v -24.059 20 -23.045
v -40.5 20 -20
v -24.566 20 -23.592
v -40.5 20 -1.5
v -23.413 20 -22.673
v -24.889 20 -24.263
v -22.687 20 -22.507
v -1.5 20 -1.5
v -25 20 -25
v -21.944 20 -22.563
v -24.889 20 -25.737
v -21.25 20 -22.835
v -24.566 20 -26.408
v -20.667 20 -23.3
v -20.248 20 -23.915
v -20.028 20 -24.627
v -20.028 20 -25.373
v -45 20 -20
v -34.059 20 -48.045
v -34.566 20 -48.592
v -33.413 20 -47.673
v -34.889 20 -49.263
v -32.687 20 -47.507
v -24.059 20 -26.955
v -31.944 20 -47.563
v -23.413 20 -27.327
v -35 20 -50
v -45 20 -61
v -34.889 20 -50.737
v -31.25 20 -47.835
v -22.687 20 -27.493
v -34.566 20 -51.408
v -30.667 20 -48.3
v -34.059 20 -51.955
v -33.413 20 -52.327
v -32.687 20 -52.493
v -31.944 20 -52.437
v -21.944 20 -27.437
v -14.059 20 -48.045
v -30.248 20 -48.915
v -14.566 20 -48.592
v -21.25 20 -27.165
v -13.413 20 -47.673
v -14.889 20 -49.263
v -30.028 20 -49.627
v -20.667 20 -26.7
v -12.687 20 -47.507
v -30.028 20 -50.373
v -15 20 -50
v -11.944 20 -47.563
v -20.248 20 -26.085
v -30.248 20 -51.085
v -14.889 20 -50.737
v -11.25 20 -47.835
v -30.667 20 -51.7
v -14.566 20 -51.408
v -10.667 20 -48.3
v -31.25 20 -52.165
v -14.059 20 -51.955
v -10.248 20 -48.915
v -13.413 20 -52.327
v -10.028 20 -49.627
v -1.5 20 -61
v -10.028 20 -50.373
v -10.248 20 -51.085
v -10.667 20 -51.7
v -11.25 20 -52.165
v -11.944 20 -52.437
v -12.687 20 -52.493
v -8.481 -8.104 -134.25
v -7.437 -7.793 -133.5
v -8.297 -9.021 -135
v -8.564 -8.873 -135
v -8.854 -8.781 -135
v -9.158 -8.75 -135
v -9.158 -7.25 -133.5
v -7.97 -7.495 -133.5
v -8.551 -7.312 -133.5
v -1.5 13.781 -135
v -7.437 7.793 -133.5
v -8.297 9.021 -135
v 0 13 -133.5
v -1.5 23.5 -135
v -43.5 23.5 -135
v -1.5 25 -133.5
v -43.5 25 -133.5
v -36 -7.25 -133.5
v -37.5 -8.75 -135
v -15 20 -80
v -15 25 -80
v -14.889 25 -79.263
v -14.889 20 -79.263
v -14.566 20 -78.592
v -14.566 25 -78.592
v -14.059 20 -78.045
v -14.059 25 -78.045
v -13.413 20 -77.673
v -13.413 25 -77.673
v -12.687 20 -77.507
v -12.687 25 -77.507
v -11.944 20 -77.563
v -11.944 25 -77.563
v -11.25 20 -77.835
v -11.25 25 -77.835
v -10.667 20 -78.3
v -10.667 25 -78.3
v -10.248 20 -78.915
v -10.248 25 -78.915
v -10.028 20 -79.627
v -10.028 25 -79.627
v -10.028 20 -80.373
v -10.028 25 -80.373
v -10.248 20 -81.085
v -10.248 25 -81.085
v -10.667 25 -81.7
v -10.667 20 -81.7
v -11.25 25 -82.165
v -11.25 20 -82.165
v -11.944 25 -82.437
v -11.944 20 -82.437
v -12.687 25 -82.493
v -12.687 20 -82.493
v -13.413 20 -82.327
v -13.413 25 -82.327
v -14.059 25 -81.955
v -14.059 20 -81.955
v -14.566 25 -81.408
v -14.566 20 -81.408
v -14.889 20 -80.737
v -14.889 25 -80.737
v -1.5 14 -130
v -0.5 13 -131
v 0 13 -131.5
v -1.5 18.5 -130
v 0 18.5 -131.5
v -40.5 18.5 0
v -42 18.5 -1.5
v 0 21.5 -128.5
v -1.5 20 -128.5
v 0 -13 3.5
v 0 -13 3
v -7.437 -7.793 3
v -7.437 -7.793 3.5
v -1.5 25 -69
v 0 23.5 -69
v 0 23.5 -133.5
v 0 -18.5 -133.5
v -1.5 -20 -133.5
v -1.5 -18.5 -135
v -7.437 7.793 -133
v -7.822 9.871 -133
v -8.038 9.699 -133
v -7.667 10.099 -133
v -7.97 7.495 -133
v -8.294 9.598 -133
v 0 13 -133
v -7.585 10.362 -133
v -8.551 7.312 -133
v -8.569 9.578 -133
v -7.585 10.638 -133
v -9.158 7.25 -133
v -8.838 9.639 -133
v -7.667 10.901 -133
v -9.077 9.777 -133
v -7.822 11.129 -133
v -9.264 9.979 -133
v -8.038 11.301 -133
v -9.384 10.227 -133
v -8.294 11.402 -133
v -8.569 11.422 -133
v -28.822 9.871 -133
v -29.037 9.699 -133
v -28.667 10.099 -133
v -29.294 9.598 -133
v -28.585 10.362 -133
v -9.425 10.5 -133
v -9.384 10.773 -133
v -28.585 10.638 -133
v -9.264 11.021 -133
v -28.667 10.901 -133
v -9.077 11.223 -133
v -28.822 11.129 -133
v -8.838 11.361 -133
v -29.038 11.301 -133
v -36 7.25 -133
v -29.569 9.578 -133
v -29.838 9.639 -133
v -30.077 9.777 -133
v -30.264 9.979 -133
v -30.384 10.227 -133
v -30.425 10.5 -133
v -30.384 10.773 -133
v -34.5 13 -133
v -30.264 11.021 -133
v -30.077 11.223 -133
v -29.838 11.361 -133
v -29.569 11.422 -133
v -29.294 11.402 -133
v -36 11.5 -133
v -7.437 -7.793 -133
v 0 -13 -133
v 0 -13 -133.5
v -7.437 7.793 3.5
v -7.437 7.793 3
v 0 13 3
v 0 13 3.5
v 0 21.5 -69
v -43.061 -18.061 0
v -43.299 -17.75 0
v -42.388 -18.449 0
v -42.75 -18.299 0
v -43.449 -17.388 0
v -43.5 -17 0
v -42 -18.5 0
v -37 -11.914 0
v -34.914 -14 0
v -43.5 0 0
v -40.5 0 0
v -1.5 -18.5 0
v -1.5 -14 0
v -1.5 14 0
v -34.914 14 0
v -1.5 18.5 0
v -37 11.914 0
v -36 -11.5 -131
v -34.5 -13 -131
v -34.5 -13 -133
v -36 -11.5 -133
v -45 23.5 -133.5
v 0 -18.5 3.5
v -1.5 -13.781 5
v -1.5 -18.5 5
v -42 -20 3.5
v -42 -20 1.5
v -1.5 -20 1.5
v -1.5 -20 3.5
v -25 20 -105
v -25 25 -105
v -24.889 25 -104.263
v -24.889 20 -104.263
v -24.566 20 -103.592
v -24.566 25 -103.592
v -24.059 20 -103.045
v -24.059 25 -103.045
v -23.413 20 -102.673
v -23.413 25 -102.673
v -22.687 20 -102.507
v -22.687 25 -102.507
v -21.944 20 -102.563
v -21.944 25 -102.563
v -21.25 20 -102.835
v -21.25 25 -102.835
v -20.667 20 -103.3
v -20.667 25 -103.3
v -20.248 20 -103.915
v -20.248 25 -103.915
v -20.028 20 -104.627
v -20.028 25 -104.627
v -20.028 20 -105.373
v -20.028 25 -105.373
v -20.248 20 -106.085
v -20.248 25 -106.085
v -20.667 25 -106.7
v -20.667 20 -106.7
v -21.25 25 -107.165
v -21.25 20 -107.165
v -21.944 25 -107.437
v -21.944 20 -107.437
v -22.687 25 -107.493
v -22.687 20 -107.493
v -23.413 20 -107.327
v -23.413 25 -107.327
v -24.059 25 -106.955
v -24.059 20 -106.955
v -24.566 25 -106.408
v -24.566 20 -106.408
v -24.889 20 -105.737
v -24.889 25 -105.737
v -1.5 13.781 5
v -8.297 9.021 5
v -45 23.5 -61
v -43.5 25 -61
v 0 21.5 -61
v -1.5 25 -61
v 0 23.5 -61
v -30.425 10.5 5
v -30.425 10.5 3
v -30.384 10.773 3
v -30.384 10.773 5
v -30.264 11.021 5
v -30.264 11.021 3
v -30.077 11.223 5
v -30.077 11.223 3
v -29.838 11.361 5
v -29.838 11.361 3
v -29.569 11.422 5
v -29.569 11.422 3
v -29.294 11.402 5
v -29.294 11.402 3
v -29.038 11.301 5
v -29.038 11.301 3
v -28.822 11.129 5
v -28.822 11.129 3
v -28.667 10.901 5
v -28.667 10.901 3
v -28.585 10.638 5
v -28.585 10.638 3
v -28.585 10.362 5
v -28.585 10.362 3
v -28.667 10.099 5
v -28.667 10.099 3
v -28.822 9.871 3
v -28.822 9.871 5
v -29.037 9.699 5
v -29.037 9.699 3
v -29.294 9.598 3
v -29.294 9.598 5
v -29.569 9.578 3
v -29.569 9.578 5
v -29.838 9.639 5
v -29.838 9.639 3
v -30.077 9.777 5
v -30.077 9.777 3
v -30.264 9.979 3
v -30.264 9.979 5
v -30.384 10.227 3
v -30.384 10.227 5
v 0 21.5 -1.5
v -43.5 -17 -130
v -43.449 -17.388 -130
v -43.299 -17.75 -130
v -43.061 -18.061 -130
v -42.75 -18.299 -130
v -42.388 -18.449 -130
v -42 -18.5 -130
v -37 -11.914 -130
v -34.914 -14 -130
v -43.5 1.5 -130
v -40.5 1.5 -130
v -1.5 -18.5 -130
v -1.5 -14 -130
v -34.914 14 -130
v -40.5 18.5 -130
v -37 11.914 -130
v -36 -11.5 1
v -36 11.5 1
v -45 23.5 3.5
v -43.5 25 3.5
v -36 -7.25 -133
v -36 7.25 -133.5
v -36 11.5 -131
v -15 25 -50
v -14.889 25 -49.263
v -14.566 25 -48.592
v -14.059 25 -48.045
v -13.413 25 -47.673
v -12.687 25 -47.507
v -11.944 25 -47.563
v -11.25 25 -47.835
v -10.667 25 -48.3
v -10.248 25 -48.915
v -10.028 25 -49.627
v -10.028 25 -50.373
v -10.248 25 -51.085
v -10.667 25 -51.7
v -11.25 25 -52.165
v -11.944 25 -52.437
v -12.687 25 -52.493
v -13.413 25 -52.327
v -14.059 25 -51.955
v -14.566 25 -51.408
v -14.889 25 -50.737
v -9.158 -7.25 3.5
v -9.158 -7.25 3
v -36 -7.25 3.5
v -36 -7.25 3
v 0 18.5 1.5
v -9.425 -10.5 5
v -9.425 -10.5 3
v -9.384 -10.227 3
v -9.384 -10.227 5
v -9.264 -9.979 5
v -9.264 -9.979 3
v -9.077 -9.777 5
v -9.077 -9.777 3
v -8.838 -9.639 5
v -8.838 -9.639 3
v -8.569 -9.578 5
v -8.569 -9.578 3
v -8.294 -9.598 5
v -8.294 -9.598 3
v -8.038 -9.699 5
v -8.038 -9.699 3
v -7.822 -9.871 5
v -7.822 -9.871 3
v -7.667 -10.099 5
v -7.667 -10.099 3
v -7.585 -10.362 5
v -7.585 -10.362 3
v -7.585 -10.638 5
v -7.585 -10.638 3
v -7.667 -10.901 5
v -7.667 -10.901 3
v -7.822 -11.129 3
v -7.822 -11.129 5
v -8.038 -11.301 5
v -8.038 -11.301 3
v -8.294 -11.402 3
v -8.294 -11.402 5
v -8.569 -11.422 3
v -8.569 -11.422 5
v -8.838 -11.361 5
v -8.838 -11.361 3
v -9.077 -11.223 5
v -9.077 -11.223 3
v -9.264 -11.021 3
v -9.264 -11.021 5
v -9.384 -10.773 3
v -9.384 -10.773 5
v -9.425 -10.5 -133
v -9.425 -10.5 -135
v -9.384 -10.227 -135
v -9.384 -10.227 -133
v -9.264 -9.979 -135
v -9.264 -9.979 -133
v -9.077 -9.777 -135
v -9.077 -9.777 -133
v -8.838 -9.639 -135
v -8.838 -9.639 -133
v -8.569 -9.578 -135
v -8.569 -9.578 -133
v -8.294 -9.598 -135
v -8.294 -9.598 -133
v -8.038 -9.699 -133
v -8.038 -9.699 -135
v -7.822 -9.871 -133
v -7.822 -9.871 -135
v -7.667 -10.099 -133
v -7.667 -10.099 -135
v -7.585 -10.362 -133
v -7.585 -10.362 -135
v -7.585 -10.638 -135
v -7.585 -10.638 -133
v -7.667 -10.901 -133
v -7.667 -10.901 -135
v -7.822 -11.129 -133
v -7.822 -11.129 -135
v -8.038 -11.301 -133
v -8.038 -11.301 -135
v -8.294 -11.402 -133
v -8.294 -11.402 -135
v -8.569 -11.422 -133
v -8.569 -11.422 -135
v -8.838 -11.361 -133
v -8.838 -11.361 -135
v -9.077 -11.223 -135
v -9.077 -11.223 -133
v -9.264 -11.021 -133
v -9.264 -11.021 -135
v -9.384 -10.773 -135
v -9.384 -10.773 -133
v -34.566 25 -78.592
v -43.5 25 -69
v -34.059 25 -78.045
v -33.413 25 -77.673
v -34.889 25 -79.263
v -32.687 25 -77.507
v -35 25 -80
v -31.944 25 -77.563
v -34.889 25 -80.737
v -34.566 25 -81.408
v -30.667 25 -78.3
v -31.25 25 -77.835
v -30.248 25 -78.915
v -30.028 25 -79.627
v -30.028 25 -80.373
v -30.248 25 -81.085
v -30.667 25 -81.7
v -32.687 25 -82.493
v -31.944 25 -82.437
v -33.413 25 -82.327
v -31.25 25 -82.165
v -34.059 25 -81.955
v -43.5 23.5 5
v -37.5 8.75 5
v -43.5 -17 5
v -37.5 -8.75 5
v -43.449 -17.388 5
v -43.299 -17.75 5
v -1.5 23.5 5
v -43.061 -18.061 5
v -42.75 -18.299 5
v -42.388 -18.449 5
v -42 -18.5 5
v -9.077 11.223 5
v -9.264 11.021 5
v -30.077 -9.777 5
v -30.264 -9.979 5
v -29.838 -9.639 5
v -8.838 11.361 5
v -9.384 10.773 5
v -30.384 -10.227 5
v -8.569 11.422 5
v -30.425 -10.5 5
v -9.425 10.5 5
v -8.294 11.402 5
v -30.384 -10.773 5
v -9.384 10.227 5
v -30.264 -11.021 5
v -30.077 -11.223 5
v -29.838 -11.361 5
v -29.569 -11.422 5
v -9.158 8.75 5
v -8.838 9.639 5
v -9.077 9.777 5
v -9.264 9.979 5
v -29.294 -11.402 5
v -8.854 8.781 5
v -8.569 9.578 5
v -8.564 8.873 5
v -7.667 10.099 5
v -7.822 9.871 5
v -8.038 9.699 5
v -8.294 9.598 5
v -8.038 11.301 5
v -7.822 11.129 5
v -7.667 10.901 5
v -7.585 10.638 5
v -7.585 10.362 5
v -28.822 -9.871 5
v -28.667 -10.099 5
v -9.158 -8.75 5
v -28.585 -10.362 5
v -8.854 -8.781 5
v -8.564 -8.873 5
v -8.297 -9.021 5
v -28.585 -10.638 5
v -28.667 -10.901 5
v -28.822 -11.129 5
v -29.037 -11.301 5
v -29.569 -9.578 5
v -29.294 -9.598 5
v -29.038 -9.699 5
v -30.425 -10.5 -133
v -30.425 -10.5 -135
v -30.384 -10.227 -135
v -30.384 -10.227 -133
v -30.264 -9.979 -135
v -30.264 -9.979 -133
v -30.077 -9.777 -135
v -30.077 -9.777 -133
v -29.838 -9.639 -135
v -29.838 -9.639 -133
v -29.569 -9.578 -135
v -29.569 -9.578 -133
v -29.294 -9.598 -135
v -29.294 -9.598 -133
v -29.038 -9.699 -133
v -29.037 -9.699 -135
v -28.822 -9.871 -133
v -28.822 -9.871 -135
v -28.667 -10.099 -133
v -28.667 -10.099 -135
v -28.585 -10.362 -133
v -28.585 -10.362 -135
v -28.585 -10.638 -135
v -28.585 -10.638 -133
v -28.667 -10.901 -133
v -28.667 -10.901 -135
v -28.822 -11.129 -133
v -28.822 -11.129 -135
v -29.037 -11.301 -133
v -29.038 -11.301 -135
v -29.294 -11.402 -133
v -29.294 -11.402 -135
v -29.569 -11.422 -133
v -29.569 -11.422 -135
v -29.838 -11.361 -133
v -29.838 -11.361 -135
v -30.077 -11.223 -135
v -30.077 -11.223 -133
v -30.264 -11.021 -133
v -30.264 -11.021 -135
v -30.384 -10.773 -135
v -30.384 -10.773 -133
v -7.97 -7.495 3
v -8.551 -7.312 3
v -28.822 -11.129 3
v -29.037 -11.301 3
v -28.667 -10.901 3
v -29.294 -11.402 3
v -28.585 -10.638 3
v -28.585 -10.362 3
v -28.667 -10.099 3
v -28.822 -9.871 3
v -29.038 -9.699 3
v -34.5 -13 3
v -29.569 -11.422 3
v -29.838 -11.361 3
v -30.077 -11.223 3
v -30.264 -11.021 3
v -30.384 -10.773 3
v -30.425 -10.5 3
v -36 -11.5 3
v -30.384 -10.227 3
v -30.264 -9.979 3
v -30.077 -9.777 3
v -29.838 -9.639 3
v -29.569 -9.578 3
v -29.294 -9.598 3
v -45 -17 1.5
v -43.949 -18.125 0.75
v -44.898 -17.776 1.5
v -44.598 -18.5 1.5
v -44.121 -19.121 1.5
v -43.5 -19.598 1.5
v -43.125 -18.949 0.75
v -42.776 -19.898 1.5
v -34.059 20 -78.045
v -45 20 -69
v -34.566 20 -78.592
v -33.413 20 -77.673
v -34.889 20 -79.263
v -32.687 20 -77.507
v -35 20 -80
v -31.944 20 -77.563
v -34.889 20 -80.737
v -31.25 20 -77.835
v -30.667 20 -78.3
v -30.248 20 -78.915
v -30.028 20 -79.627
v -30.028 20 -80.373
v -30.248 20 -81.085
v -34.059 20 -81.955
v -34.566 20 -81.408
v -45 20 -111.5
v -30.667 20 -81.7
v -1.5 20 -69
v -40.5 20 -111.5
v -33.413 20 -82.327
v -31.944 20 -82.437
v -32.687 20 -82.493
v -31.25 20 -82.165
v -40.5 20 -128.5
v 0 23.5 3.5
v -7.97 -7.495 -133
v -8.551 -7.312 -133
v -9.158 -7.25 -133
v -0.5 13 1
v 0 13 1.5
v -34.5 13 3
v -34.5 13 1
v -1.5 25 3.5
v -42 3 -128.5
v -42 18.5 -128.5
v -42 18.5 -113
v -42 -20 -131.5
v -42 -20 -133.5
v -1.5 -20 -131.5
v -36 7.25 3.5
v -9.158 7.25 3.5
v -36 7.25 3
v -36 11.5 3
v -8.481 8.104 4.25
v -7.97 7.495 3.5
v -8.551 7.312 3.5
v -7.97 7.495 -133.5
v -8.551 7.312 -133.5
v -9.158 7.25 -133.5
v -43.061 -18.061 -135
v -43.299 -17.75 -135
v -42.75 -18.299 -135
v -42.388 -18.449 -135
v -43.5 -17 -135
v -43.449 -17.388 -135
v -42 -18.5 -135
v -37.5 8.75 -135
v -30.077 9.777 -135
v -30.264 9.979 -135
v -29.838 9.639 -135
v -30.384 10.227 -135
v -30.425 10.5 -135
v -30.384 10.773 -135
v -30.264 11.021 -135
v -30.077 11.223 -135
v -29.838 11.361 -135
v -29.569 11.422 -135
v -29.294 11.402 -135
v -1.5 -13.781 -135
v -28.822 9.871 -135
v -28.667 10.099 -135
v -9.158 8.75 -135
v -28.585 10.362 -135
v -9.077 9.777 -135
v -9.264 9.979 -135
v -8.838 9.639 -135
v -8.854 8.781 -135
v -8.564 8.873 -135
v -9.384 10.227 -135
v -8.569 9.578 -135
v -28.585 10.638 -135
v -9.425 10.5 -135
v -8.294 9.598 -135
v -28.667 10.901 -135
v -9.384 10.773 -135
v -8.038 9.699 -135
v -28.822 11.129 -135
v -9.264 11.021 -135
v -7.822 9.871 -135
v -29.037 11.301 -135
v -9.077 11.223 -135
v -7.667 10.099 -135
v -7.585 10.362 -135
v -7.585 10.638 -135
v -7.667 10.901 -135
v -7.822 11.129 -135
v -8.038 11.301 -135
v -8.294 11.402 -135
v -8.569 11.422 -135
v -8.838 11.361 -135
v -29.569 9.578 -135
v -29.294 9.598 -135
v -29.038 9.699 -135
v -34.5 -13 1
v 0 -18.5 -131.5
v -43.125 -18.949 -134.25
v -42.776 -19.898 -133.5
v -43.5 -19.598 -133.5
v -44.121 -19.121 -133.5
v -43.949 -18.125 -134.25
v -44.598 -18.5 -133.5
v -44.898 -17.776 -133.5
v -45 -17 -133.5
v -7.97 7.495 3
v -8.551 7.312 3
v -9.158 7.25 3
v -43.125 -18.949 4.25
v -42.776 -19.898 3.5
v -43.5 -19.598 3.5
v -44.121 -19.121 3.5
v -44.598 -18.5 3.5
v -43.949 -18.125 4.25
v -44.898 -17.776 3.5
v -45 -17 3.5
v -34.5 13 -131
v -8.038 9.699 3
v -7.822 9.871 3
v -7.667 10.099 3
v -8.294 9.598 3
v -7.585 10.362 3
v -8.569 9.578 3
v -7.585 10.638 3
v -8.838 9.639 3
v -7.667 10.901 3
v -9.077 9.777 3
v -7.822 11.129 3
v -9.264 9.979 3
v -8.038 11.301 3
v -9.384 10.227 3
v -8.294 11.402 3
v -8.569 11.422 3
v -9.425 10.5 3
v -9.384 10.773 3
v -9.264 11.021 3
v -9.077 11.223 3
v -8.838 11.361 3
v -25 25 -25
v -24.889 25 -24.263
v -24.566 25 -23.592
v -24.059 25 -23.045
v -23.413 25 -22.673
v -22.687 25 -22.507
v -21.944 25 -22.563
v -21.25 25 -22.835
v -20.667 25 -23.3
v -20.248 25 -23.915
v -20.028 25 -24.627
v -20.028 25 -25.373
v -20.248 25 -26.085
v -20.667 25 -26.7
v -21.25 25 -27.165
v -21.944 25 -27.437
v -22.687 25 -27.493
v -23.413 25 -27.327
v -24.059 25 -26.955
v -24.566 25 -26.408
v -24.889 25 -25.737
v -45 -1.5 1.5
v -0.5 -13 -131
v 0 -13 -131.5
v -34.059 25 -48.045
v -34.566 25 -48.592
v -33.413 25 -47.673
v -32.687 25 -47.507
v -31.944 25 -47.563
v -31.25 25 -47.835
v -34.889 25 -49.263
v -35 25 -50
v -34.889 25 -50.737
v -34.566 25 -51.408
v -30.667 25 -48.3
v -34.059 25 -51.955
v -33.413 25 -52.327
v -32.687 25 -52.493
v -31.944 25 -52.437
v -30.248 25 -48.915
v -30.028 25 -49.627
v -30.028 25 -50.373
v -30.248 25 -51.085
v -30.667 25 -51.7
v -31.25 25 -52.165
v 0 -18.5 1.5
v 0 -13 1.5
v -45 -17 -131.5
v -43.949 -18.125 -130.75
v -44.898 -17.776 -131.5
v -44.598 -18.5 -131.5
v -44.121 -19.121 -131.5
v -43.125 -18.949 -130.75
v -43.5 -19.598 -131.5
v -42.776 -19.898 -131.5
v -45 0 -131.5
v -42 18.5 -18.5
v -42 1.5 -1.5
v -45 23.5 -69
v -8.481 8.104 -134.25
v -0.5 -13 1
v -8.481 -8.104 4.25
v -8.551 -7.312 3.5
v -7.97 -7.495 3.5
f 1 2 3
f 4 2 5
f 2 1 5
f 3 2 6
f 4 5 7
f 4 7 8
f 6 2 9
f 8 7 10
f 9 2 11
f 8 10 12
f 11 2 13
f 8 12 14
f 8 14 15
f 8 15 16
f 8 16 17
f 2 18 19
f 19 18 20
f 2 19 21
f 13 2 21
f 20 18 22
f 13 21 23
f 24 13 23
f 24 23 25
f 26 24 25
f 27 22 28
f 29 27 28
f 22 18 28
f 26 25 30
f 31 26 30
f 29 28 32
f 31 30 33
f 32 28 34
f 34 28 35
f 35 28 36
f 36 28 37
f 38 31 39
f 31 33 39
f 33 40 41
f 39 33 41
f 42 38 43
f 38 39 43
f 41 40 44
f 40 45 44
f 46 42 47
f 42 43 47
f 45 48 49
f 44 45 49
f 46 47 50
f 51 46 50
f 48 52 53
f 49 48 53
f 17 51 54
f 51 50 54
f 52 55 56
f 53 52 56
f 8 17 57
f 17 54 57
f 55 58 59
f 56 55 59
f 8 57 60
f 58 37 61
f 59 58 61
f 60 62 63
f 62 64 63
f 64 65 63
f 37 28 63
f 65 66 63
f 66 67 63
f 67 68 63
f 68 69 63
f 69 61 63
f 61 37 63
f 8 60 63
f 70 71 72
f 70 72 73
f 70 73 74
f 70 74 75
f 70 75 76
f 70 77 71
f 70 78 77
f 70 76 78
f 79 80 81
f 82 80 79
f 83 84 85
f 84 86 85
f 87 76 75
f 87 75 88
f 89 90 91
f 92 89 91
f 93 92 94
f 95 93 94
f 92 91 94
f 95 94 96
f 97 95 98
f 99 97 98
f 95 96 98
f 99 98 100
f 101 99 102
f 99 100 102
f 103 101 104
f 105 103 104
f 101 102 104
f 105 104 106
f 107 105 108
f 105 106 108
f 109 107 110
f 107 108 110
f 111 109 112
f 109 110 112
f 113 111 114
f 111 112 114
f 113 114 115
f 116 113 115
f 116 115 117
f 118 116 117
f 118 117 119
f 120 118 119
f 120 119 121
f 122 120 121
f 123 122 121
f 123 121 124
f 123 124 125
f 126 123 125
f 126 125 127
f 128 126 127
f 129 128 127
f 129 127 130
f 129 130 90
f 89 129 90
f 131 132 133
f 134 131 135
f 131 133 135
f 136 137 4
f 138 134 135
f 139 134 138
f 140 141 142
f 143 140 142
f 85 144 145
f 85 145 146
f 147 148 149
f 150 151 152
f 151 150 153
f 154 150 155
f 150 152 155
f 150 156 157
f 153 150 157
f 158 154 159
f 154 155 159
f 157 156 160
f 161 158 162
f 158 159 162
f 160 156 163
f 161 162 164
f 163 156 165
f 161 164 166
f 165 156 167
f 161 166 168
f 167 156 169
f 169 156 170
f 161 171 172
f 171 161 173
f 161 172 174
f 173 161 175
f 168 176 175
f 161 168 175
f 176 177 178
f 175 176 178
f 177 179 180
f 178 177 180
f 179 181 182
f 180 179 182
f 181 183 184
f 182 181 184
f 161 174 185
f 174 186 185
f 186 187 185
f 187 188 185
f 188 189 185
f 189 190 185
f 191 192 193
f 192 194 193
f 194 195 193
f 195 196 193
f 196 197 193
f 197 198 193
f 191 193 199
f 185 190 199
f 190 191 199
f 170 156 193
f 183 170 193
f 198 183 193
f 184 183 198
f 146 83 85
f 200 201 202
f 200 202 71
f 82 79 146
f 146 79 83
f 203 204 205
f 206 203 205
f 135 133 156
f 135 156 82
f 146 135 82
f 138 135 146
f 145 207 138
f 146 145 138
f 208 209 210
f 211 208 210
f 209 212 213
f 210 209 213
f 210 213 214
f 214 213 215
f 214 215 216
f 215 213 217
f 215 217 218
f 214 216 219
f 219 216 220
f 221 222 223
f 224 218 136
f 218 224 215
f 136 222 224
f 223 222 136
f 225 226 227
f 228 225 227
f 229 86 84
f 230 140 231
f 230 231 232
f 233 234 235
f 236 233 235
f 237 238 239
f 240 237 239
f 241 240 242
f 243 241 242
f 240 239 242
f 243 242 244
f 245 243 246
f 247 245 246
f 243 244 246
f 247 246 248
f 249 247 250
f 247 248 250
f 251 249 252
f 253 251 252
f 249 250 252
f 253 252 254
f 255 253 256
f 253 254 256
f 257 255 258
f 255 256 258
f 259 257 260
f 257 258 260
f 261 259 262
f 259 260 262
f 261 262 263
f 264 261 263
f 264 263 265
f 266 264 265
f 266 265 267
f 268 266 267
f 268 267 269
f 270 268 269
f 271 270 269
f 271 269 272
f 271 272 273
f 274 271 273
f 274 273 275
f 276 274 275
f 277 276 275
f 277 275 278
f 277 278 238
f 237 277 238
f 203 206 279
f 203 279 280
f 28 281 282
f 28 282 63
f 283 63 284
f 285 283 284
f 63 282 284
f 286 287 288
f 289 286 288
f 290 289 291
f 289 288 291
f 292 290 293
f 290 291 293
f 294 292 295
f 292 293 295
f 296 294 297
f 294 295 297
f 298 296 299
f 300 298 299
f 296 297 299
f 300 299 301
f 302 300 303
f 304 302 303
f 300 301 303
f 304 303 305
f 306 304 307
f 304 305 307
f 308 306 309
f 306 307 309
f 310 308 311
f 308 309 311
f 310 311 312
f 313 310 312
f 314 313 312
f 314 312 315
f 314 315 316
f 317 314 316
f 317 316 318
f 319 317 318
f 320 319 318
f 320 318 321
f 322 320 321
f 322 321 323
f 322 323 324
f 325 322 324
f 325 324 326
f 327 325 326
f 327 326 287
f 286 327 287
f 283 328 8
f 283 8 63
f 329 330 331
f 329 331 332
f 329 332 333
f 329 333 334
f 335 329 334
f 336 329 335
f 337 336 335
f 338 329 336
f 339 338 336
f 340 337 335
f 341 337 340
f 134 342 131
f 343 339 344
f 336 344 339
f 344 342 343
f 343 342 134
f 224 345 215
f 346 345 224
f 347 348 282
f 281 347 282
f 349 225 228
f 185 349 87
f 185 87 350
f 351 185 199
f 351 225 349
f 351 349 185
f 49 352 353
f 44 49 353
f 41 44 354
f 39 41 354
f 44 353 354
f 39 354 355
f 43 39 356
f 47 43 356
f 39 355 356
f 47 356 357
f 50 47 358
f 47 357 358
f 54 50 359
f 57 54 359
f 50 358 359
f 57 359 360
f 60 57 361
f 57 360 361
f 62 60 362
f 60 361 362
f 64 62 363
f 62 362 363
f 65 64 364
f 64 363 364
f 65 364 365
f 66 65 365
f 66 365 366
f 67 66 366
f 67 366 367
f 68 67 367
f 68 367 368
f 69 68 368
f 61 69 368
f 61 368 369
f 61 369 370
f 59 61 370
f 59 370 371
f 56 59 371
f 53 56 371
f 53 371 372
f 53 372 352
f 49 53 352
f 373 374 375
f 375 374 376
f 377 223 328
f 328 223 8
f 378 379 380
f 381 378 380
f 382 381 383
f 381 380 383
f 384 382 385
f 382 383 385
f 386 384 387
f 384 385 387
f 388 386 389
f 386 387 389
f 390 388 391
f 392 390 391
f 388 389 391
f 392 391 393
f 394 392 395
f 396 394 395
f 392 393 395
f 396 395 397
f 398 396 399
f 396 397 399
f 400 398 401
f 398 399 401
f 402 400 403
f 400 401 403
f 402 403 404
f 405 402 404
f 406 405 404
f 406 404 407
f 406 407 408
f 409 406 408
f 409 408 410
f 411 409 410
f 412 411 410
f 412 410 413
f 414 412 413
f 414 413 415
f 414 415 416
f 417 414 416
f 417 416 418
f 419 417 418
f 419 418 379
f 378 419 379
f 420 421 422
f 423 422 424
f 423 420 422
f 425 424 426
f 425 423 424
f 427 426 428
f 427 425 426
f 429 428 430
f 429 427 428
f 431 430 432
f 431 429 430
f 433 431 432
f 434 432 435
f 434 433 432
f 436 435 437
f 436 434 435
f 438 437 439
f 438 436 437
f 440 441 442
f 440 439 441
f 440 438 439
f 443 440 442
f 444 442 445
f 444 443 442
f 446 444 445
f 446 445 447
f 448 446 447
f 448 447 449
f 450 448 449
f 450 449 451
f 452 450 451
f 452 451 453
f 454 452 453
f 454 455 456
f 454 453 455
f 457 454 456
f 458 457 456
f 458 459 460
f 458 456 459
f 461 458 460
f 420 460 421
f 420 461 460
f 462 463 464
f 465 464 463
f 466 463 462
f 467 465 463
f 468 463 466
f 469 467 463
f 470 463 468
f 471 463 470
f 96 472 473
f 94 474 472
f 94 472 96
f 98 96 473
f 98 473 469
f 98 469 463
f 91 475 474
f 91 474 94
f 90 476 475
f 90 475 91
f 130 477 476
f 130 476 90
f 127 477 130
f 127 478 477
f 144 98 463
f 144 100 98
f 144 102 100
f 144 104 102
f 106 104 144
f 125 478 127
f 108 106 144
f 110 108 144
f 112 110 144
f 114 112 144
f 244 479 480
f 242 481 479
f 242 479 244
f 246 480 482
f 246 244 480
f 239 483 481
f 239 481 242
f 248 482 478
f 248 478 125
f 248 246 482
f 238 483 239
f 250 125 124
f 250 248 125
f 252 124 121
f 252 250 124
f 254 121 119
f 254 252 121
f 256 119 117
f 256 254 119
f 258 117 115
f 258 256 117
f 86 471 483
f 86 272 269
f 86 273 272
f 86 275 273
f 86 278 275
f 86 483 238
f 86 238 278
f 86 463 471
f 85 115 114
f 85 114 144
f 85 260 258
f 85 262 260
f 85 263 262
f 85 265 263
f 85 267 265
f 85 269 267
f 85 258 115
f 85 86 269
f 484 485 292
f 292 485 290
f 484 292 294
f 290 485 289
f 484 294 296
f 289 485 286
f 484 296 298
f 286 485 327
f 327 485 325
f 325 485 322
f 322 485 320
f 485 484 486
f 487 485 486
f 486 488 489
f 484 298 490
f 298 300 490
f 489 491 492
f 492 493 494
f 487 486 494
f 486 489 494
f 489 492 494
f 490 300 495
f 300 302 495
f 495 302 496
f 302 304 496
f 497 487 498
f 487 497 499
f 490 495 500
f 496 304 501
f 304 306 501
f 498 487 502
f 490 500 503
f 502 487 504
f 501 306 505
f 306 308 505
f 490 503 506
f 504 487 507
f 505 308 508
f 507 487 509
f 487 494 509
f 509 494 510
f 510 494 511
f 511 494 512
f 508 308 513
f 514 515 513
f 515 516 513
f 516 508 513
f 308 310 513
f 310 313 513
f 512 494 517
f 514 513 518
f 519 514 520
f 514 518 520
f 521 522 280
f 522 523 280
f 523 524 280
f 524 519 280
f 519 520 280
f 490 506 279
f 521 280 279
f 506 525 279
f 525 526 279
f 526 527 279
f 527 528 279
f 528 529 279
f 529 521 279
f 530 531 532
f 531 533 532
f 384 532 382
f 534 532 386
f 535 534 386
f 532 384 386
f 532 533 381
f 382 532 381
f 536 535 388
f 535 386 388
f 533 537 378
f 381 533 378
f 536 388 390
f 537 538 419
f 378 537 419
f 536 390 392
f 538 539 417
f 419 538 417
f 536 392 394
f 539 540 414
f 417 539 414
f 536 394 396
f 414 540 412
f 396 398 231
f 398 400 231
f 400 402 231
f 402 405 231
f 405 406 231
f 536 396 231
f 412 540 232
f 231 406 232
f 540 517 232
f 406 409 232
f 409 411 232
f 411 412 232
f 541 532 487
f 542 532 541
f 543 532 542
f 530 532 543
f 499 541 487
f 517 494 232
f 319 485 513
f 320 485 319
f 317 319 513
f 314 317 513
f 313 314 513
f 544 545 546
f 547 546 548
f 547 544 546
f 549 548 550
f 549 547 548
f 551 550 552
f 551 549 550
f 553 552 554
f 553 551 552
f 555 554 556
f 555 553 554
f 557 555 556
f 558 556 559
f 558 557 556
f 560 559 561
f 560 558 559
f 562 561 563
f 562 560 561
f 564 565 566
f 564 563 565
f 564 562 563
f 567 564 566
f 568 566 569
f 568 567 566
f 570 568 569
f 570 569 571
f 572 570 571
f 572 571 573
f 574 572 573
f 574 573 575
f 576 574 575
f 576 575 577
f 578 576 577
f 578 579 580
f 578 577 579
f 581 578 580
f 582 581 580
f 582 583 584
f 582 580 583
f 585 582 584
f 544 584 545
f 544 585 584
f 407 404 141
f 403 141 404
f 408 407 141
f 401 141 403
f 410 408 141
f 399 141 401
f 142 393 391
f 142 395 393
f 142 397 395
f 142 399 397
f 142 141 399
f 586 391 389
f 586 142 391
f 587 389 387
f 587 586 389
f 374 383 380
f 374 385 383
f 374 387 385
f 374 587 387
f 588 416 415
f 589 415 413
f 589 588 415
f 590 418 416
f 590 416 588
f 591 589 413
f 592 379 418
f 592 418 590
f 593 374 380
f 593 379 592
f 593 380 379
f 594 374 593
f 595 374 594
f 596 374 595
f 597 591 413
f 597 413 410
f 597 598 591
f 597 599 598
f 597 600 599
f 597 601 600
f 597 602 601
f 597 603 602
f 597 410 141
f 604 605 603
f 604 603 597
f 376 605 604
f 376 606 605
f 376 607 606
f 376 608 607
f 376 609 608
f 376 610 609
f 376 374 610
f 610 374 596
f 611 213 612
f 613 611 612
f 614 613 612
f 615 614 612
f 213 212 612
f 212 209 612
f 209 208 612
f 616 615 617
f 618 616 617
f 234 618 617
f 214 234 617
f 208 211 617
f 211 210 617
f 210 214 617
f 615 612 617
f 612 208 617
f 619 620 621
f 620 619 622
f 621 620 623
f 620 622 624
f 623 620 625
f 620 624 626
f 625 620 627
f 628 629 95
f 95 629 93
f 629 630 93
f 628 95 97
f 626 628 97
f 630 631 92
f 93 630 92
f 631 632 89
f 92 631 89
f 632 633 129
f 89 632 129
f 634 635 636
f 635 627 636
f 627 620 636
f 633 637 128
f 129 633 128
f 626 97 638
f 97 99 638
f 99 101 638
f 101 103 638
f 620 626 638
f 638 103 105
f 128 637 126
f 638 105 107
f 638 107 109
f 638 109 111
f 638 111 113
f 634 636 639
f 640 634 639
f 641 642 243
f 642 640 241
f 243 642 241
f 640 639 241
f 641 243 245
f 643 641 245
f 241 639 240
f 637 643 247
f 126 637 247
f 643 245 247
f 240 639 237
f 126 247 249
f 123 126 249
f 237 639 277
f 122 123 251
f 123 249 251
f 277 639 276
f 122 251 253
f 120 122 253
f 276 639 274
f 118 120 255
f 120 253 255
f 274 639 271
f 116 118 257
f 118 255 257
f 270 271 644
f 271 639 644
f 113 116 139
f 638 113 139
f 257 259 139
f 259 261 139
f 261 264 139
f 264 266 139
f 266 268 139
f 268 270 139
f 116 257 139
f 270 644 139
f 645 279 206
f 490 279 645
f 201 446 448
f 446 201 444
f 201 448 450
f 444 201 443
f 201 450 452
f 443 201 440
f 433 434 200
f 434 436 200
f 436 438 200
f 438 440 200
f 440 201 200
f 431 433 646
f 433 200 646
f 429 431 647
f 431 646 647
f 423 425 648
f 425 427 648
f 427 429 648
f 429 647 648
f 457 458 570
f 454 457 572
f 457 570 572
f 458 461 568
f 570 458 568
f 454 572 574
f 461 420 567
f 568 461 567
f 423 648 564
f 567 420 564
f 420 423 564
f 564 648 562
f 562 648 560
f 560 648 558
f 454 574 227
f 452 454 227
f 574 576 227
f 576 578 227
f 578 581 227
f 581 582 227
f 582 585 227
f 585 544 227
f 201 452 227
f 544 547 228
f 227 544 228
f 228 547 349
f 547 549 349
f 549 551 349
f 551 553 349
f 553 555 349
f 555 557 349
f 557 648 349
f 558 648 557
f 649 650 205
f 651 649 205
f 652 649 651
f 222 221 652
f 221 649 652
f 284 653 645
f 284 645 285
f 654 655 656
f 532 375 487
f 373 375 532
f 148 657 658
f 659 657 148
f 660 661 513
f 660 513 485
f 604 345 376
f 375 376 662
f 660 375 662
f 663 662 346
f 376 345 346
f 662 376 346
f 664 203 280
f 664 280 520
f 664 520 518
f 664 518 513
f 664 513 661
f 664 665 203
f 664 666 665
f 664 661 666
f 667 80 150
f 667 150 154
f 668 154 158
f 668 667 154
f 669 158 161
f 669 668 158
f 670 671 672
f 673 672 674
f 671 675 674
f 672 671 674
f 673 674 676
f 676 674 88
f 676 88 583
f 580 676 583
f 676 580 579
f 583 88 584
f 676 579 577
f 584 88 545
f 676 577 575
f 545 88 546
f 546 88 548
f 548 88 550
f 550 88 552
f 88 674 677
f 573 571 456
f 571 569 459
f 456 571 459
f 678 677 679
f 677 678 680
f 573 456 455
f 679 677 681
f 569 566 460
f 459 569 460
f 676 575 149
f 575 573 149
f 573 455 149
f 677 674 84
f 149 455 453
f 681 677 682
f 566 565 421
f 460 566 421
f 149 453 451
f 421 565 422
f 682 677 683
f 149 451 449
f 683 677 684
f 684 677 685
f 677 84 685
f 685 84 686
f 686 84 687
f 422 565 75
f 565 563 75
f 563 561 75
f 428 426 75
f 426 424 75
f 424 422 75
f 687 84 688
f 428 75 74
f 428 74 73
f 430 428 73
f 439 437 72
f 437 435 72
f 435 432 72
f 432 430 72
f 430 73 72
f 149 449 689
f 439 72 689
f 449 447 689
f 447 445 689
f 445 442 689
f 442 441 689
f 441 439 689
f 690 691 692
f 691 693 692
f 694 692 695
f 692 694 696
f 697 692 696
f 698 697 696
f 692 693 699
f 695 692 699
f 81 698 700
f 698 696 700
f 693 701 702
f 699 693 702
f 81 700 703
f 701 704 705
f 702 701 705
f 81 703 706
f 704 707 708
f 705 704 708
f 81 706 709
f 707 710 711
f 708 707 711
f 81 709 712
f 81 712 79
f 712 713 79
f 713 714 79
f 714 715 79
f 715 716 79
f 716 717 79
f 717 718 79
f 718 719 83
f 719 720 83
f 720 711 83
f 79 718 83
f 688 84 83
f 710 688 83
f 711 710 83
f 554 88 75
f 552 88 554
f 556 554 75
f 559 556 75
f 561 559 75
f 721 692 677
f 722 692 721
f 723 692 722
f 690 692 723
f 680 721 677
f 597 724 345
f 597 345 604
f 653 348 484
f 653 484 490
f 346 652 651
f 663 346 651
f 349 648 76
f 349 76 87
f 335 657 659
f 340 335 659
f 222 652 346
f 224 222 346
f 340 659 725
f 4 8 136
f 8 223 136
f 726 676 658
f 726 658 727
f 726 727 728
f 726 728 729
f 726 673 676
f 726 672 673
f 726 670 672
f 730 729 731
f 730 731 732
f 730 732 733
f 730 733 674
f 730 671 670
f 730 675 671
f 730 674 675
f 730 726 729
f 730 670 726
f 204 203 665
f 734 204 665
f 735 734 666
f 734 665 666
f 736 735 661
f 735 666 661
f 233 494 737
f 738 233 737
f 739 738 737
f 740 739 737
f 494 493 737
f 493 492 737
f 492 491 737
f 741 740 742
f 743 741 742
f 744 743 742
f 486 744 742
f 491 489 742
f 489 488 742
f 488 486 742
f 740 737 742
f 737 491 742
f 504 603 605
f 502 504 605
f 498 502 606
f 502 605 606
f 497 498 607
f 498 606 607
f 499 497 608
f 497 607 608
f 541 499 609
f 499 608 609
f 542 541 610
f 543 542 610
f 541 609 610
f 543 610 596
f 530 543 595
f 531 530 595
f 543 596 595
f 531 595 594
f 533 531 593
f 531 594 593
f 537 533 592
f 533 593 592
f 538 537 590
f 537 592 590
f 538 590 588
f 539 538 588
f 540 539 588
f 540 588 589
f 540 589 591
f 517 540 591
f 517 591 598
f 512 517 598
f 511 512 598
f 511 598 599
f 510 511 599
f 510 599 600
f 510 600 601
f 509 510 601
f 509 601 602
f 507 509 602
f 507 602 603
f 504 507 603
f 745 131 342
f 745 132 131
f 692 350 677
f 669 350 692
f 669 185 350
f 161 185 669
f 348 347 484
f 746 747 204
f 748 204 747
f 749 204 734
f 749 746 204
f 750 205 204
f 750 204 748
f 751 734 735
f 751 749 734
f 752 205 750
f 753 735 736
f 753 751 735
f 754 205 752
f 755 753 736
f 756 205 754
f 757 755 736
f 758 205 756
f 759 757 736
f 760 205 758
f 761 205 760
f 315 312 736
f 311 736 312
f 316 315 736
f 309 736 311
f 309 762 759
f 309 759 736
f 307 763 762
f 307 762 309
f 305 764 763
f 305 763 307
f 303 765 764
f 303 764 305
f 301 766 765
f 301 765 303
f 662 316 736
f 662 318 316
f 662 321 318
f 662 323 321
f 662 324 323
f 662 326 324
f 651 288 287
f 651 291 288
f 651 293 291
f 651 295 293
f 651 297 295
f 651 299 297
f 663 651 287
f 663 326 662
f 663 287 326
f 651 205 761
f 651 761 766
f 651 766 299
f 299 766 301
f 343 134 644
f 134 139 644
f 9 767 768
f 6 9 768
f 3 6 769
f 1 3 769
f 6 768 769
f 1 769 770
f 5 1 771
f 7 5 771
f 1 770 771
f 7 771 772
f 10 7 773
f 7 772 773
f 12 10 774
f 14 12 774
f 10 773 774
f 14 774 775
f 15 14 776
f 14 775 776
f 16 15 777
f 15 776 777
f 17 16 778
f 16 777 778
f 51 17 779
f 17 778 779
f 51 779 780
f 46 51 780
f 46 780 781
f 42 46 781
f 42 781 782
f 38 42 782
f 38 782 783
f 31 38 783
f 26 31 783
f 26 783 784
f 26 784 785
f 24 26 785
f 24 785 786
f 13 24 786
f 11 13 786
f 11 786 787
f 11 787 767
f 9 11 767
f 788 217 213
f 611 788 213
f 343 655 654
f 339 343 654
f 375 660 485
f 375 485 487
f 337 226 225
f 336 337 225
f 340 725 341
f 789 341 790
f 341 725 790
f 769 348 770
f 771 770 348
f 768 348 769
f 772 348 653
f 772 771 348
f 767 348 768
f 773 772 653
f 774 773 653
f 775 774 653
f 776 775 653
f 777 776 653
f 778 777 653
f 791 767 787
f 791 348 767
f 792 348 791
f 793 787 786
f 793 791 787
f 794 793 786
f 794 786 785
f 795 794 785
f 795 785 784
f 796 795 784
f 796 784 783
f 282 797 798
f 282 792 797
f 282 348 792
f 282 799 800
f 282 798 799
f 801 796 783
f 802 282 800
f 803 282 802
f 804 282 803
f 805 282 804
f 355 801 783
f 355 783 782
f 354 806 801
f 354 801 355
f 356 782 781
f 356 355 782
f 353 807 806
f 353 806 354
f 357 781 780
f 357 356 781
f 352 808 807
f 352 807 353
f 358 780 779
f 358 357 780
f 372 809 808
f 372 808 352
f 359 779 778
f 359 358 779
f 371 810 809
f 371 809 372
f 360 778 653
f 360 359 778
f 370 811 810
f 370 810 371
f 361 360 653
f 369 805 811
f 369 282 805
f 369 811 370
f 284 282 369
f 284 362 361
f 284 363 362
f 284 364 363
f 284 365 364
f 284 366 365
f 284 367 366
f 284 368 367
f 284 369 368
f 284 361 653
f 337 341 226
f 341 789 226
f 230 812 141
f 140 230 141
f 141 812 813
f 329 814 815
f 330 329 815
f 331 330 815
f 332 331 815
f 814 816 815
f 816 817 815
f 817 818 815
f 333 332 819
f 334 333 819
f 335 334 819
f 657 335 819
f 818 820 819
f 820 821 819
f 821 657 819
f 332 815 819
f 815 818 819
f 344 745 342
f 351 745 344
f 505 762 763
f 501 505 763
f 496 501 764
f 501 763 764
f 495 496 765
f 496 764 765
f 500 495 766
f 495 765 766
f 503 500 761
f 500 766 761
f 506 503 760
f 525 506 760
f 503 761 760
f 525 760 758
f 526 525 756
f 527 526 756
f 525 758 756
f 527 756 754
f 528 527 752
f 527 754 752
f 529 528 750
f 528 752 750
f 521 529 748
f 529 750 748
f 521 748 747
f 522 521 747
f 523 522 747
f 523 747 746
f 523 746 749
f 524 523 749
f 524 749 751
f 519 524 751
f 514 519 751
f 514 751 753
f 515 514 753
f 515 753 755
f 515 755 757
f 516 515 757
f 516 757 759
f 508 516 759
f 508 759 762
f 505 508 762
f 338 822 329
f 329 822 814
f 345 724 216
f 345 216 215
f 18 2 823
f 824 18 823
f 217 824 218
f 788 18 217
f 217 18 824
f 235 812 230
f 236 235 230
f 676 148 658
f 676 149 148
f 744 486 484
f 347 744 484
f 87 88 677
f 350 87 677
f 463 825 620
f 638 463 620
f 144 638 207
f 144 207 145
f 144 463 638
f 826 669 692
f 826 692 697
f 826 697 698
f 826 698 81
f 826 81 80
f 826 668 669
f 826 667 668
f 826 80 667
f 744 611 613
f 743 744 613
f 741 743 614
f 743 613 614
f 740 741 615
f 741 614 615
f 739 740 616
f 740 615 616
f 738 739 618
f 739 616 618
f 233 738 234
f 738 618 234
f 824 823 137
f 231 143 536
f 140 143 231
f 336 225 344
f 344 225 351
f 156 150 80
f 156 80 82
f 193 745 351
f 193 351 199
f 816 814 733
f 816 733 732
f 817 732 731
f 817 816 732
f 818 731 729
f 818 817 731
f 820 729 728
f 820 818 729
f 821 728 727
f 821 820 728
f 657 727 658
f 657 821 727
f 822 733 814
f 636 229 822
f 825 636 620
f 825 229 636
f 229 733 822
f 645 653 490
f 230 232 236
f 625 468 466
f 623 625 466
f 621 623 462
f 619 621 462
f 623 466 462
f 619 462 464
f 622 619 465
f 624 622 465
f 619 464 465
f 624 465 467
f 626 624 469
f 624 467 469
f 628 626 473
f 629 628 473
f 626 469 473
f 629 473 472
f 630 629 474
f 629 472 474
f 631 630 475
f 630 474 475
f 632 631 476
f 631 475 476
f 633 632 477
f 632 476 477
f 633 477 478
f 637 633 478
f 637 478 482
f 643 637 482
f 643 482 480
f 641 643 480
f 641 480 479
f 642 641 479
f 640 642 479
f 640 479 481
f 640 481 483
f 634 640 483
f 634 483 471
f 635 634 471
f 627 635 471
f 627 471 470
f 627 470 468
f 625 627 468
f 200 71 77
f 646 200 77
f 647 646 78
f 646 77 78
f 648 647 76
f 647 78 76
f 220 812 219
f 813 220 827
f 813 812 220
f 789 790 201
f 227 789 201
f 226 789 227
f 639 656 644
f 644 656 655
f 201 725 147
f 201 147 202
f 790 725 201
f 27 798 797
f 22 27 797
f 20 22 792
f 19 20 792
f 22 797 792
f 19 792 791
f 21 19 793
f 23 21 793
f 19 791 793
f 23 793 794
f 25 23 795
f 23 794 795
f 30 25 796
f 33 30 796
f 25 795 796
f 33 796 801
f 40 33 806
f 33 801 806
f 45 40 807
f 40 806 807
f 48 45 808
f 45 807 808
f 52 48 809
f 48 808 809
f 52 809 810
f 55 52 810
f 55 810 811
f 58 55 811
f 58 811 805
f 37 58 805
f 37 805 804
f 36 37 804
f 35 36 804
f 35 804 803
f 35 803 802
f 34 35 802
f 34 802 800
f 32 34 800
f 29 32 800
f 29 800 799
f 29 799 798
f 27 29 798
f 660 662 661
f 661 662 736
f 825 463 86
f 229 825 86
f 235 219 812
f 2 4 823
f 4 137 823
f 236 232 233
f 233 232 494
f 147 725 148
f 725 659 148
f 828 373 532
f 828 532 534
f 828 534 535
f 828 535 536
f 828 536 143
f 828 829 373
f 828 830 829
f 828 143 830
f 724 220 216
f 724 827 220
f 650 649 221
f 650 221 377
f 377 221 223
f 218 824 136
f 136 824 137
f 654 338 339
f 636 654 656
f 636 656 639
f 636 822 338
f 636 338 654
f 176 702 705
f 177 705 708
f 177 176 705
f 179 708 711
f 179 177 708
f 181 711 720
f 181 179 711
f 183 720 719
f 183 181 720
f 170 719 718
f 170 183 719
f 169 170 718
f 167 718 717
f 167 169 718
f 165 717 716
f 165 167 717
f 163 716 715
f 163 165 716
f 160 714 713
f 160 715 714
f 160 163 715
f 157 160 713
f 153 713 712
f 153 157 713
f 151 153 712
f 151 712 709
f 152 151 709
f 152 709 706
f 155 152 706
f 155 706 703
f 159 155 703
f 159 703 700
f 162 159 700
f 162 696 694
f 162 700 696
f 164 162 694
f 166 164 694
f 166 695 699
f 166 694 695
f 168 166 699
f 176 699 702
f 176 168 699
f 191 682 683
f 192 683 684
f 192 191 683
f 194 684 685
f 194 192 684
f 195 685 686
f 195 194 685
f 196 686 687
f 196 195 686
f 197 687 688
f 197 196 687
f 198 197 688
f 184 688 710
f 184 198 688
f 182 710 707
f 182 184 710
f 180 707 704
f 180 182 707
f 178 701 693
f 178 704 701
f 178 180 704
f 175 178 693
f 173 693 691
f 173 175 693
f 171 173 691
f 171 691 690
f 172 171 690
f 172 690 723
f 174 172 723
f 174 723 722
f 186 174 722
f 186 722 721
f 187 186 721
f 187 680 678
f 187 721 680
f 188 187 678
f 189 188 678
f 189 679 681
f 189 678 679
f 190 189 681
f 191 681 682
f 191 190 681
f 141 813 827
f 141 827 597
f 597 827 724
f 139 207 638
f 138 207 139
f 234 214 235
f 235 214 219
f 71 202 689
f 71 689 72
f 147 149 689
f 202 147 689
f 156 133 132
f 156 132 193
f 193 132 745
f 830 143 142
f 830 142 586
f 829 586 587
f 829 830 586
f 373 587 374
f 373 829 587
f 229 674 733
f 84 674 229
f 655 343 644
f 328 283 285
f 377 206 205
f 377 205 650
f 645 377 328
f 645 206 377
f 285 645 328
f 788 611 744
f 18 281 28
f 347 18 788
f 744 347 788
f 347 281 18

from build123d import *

# Parameters (mm, degrees)
EXTRUDE_1_DEPTH            = 5
SKETCH_2_W                 = 36
SKETCH_2_H                 = 26
CUT_EXTRUDE_1_DEPTH        = 3
CUT_EXTRUDE_2_DEPTH        = 50.497474683
SKETCH_4_R                 = 0.925
CUT_EXTRUDE_3_DEPTH        = 50.335585534
CHAMFER_1_SIZE             = 1.5
CHAMFER_2_SIZE             = 1
FILLET_3_R                 = 3
SKETCH_7_W                 = 45
SKETCH_7_H                 = 140
EXTRUDE_2_DEPTH            = 5
SKETCH_9_R                 = 2.5
CUT_EXTRUDE_5_DEPTH        = 150.248115566
CHAMFER_1_OF_MIRROR_1_SIZE = 1.5
CHAMFER_2_OF_MIRROR_1_SIZE = 1
FILLET_3_OF_MIRROR_1_R     = 3
EXTRUDE_3_DEPTH            = 3
CHAMFER_4_SIZE             = 1.5
SKETCH_12_W                = 45
SKETCH_12_H                = 8
CUT_EXTRUDE_6_DEPTH        = 150.248115566


with BuildPart() as part:
    # 草图1 → 凸台-拉伸1 (new body)
    with BuildSketch(Plane.XY):
        with BuildLine():
            Line((-42, -20), (0, -20))
            ThreePointArc((0, -20), (20, 0), (0, 20))
            Line((0, 20), (-45, 20))
            Line((-45, 20), (-45, -17))
            ThreePointArc((-45, -17), (-44.121320344, -19.121320344), (-42, -20))
        make_face()
    extrude_1 = extrude(amount=EXTRUDE_1_DEPTH)

    # 草图2 → 切除-拉伸1 (cut)
    with BuildSketch(Plane(origin=(0, 0, 0), x_dir=(-1, 0, 0), z_dir=(0, 0, -1))):
        with Locations((18, 0)):
            Rectangle(SKETCH_2_W, SKETCH_2_H)
    cut_extrude_1 = extrude(amount=-CUT_EXTRUDE_1_DEPTH, mode=Mode.SUBTRACT)

    # 草图3 → 切除-拉伸2 (cut, through all)
    with BuildSketch(Plane(origin=(0, 0, 0), x_dir=(-1, 0, 0), z_dir=(0, 0, -1))):
        with BuildLine():
            Line((0, -20), (0, 20))
            ThreePointArc((0, 20), (-20, 0), (0, -20))
        make_face()
    cut_extrude_2 = extrude(amount=-CUT_EXTRUDE_2_DEPTH, mode=Mode.SUBTRACT)

    # 草图4 → 切除-拉伸3 (cut, through all)
    with BuildSketch(Plane(origin=(0, 0, 3), x_dir=(-1, 0, 0), z_dir=(0, 0, -1))):
        with Locations((8.5, 10.5)):
            Circle(SKETCH_4_R)
        with Locations((8.5, -10.5)):
            Circle(SKETCH_4_R)
        with Locations((29.5, 10.5)):
            Circle(SKETCH_4_R)
        with Locations((29.5, -10.5)):
            Circle(SKETCH_4_R)
        Polygon((8.211851039, -7.25), (36, -7.25), (36, 7.25), (8.211851039, 7.25), (0, 13), (0, -13), align=None)
    cut_extrude_3 = extrude(amount=-CUT_EXTRUDE_3_DEPTH, mode=Mode.SUBTRACT)

    # 倒角1
    chamfer_1_edges = [part.edges().sort_by_distance(p)[0] for p in [
        (-36, 13, 1.5),
        (-36, -13, 1.5),
    ]]
    chamfer(chamfer_1_edges, length=CHAMFER_1_SIZE)

    # 倒角2
    chamfer_2_edges = [part.edges().sort_by_distance(p)[0] for p in [
        (-17.25, -13, 0),
        (-17.25, 13, 0),
        (-36, 0, 0),
        (-35.25, 12.25, 0),
        (-35.25, -12.25, 0),
    ]]
    chamfer(chamfer_2_edges, length=CHAMFER_2_SIZE)

    # 圆角3
    fillet_3_edges = [part.edges().sort_by_distance(p)[0] for p in [
        (-8.211851039, 7.25, 4),
        (-8.211851039, -7.25, 4),
    ]]
    fillet(fillet_3_edges, radius=FILLET_3_R)

    # 草图7 → 凸台-拉伸2 (add)
    with BuildSketch(Plane(origin=(0, 20, 0), x_dir=(1, 0, 0), z_dir=(0, 1, 0))):
        with Locations((-22.5, 65)):
            Rectangle(SKETCH_7_W, SKETCH_7_H)
    extrude(amount=EXTRUDE_2_DEPTH)

    # 草图9 → 切除-拉伸5 (cut, through all)
    with BuildSketch(Plane(origin=(0, 25, 0), x_dir=(1, 0, 0), z_dir=(0, 1, 0))):
        with Locations(Location((-12.5, 80, 0), (0, 0, 180))):
            Circle(SKETCH_9_R)
        with Locations(Location((-32.5, 80, 0), (0, 0, 180))):
            Circle(SKETCH_9_R)
        with Locations(Location((-32.5, 50, 0), (0, 0, 180))):
            Circle(SKETCH_9_R)
        with Locations(Location((-12.5, 50, 0), (0, 0, 180))):
            Circle(SKETCH_9_R)
        with Locations(Location((-22.5, 25, 0), (0, 0, 180))):
            Circle(SKETCH_9_R)
        with Locations(Location((-22.5, 105, 0), (0, 0, 180))):
            Circle(SKETCH_9_R)
    extrude(amount=-CUT_EXTRUDE_5_DEPTH, mode=Mode.SUBTRACT)

    # 镜向1: 凸台-拉伸1, 切除-拉伸1, 切除-拉伸2, 切除-拉伸3 across plane
    add(extrude_1.mirror(Plane.XY.offset(-65)))
    add(cut_extrude_1.mirror(Plane.XY.offset(-65)), mode=Mode.SUBTRACT)
    add(cut_extrude_2.mirror(Plane.XY.offset(-65)), mode=Mode.SUBTRACT)
    add(cut_extrude_3.mirror(Plane.XY.offset(-65)), mode=Mode.SUBTRACT)

    # 倒角1 of 镜向1
    chamfer_1_of_mirror_1_edges = [part.edges().sort_by_distance(p)[0] for p in [
        (-36, 13, -131.5),
        (-36, -13, -131.5),
    ]]
    chamfer(chamfer_1_of_mirror_1_edges, length=CHAMFER_1_OF_MIRROR_1_SIZE)

    # 倒角2 of 镜向1
    chamfer_2_of_mirror_1_edges = [part.edges().sort_by_distance(p)[0] for p in [
        (-17.25, -13, -130),
        (-17.25, 13, -130),
        (-36, 0, -130),
        (-35.25, 12.25, -130),
        (-35.25, -12.25, -130),
    ]]
    chamfer(chamfer_2_of_mirror_1_edges, length=CHAMFER_2_OF_MIRROR_1_SIZE)

    # 圆角3 of 镜向1
    fillet_3_of_mirror_1_edges = [part.edges().sort_by_distance(p)[0] for p in [
        (-8.211851039, 7.25, -134),
        (-8.211851039, -7.25, -134),
    ]]
    fillet(fillet_3_of_mirror_1_edges, radius=FILLET_3_OF_MIRROR_1_R)

    # 草图11 → 凸台-拉伸3 (add)
    with BuildSketch(Plane.ZY.offset(45)):
        Polygon((-130, 20), (-130, 1.5), (-111.5, 20), align=None)
        Polygon((0, 20), (-20, 20), (0, 0), align=None)
    extrude(amount=-EXTRUDE_3_DEPTH)

    # 倒角4
    chamfer_4_edges = [part.edges().sort_by_distance(p)[0] for p in [
        (-22.578873703, -7.25, 5),
        (-3.718509048, 10.396271934, 5),
        (-8.255630007, 7.388849148, 5),
        (-8.255630007, -7.388849148, 5),
        (-45, 4, 5),
        (0, 20, -65),
        (-22.5, 25, -135),
        (0, 19, -135),
        (-45, 25, -65),
        (-45, 4, -135),
        (-22.5, 25, 5),
        (0, 25, -65),
        (-44.121320344, -19.121320344, 5),
        (-21, -20, -135),
        (0, -20, -132.5),
        (-44.121320344, -19.121320344, -135),
        (-21, 20, -130),
        (-44.121320344, -19.121320344, -130),
        (-21, -20, -130),
        (0, -17, -130),
        (-21, -20, 5),
        (0, -16.5, -135),
        (-3.718509048, -10.396271934, -135),
        (-36, 0, -135),
        (-22.578873703, 7.25, -135),
        (0, 17, -130),
        (-22.578873703, -7.25, -135),
        (-3.718509048, 10.396271934, -135),
        (-8.255630007, 7.388849148, -135),
        (-8.255630007, -7.388849148, -135),
        (-45, -8.5, 0),
        (-42, 20, -10),
        (-42, 10, 0),
        (-45, -7.75, -130),
        (-42, 10.75, -130),
        (-42, 20, -120.75),
        (0, -16.5, 5),
        (0, -17, 0),
        (0, 19, 5),
        (-21, -20, 0),
        (-22.578873703, 7.25, 5),
        (-36, 0, 5),
        (-3.718509048, -10.396271934, 5),
        (-44.121320344, -19.121320344, 0),
        (-21, 20, 0),
        (0, -20, 2.5),
        (0, 17, 0),
    ]]
    chamfer(chamfer_4_edges, length=CHAMFER_4_SIZE)

    # 草图12 → 切除-拉伸6 (cut, through all)
    with BuildSketch(Plane(origin=(0, 25, 0), x_dir=(1, 0, 0), z_dir=(0, 1, 0))):
        with Locations((-22.5, 65)):
            Rectangle(SKETCH_12_W, SKETCH_12_H)
    extrude(amount=-CUT_EXTRUDE_6_DEPTH, mode=Mode.SUBTRACT)


with BuildPart() as cut_extrude_6_piece_1:
    # of the separate pieces the step leaves, piece 1, a body of its own (cut_extrude_6_pieces)
    add(part.part.solids().sort_by_distance((0, 23.5, -61))[0])


with BuildPart() as cut_extrude_6_piece_2:
    # of the separate pieces the step leaves, piece 2, a body of its own (cut_extrude_6_pieces)
    add(part.part.solids().sort_by_distance((-7.437018096, 7.792543867, -133.5))[0])


solid = Compound([cut_extrude_6_piece_1.part, cut_extrude_6_piece_2.part])
